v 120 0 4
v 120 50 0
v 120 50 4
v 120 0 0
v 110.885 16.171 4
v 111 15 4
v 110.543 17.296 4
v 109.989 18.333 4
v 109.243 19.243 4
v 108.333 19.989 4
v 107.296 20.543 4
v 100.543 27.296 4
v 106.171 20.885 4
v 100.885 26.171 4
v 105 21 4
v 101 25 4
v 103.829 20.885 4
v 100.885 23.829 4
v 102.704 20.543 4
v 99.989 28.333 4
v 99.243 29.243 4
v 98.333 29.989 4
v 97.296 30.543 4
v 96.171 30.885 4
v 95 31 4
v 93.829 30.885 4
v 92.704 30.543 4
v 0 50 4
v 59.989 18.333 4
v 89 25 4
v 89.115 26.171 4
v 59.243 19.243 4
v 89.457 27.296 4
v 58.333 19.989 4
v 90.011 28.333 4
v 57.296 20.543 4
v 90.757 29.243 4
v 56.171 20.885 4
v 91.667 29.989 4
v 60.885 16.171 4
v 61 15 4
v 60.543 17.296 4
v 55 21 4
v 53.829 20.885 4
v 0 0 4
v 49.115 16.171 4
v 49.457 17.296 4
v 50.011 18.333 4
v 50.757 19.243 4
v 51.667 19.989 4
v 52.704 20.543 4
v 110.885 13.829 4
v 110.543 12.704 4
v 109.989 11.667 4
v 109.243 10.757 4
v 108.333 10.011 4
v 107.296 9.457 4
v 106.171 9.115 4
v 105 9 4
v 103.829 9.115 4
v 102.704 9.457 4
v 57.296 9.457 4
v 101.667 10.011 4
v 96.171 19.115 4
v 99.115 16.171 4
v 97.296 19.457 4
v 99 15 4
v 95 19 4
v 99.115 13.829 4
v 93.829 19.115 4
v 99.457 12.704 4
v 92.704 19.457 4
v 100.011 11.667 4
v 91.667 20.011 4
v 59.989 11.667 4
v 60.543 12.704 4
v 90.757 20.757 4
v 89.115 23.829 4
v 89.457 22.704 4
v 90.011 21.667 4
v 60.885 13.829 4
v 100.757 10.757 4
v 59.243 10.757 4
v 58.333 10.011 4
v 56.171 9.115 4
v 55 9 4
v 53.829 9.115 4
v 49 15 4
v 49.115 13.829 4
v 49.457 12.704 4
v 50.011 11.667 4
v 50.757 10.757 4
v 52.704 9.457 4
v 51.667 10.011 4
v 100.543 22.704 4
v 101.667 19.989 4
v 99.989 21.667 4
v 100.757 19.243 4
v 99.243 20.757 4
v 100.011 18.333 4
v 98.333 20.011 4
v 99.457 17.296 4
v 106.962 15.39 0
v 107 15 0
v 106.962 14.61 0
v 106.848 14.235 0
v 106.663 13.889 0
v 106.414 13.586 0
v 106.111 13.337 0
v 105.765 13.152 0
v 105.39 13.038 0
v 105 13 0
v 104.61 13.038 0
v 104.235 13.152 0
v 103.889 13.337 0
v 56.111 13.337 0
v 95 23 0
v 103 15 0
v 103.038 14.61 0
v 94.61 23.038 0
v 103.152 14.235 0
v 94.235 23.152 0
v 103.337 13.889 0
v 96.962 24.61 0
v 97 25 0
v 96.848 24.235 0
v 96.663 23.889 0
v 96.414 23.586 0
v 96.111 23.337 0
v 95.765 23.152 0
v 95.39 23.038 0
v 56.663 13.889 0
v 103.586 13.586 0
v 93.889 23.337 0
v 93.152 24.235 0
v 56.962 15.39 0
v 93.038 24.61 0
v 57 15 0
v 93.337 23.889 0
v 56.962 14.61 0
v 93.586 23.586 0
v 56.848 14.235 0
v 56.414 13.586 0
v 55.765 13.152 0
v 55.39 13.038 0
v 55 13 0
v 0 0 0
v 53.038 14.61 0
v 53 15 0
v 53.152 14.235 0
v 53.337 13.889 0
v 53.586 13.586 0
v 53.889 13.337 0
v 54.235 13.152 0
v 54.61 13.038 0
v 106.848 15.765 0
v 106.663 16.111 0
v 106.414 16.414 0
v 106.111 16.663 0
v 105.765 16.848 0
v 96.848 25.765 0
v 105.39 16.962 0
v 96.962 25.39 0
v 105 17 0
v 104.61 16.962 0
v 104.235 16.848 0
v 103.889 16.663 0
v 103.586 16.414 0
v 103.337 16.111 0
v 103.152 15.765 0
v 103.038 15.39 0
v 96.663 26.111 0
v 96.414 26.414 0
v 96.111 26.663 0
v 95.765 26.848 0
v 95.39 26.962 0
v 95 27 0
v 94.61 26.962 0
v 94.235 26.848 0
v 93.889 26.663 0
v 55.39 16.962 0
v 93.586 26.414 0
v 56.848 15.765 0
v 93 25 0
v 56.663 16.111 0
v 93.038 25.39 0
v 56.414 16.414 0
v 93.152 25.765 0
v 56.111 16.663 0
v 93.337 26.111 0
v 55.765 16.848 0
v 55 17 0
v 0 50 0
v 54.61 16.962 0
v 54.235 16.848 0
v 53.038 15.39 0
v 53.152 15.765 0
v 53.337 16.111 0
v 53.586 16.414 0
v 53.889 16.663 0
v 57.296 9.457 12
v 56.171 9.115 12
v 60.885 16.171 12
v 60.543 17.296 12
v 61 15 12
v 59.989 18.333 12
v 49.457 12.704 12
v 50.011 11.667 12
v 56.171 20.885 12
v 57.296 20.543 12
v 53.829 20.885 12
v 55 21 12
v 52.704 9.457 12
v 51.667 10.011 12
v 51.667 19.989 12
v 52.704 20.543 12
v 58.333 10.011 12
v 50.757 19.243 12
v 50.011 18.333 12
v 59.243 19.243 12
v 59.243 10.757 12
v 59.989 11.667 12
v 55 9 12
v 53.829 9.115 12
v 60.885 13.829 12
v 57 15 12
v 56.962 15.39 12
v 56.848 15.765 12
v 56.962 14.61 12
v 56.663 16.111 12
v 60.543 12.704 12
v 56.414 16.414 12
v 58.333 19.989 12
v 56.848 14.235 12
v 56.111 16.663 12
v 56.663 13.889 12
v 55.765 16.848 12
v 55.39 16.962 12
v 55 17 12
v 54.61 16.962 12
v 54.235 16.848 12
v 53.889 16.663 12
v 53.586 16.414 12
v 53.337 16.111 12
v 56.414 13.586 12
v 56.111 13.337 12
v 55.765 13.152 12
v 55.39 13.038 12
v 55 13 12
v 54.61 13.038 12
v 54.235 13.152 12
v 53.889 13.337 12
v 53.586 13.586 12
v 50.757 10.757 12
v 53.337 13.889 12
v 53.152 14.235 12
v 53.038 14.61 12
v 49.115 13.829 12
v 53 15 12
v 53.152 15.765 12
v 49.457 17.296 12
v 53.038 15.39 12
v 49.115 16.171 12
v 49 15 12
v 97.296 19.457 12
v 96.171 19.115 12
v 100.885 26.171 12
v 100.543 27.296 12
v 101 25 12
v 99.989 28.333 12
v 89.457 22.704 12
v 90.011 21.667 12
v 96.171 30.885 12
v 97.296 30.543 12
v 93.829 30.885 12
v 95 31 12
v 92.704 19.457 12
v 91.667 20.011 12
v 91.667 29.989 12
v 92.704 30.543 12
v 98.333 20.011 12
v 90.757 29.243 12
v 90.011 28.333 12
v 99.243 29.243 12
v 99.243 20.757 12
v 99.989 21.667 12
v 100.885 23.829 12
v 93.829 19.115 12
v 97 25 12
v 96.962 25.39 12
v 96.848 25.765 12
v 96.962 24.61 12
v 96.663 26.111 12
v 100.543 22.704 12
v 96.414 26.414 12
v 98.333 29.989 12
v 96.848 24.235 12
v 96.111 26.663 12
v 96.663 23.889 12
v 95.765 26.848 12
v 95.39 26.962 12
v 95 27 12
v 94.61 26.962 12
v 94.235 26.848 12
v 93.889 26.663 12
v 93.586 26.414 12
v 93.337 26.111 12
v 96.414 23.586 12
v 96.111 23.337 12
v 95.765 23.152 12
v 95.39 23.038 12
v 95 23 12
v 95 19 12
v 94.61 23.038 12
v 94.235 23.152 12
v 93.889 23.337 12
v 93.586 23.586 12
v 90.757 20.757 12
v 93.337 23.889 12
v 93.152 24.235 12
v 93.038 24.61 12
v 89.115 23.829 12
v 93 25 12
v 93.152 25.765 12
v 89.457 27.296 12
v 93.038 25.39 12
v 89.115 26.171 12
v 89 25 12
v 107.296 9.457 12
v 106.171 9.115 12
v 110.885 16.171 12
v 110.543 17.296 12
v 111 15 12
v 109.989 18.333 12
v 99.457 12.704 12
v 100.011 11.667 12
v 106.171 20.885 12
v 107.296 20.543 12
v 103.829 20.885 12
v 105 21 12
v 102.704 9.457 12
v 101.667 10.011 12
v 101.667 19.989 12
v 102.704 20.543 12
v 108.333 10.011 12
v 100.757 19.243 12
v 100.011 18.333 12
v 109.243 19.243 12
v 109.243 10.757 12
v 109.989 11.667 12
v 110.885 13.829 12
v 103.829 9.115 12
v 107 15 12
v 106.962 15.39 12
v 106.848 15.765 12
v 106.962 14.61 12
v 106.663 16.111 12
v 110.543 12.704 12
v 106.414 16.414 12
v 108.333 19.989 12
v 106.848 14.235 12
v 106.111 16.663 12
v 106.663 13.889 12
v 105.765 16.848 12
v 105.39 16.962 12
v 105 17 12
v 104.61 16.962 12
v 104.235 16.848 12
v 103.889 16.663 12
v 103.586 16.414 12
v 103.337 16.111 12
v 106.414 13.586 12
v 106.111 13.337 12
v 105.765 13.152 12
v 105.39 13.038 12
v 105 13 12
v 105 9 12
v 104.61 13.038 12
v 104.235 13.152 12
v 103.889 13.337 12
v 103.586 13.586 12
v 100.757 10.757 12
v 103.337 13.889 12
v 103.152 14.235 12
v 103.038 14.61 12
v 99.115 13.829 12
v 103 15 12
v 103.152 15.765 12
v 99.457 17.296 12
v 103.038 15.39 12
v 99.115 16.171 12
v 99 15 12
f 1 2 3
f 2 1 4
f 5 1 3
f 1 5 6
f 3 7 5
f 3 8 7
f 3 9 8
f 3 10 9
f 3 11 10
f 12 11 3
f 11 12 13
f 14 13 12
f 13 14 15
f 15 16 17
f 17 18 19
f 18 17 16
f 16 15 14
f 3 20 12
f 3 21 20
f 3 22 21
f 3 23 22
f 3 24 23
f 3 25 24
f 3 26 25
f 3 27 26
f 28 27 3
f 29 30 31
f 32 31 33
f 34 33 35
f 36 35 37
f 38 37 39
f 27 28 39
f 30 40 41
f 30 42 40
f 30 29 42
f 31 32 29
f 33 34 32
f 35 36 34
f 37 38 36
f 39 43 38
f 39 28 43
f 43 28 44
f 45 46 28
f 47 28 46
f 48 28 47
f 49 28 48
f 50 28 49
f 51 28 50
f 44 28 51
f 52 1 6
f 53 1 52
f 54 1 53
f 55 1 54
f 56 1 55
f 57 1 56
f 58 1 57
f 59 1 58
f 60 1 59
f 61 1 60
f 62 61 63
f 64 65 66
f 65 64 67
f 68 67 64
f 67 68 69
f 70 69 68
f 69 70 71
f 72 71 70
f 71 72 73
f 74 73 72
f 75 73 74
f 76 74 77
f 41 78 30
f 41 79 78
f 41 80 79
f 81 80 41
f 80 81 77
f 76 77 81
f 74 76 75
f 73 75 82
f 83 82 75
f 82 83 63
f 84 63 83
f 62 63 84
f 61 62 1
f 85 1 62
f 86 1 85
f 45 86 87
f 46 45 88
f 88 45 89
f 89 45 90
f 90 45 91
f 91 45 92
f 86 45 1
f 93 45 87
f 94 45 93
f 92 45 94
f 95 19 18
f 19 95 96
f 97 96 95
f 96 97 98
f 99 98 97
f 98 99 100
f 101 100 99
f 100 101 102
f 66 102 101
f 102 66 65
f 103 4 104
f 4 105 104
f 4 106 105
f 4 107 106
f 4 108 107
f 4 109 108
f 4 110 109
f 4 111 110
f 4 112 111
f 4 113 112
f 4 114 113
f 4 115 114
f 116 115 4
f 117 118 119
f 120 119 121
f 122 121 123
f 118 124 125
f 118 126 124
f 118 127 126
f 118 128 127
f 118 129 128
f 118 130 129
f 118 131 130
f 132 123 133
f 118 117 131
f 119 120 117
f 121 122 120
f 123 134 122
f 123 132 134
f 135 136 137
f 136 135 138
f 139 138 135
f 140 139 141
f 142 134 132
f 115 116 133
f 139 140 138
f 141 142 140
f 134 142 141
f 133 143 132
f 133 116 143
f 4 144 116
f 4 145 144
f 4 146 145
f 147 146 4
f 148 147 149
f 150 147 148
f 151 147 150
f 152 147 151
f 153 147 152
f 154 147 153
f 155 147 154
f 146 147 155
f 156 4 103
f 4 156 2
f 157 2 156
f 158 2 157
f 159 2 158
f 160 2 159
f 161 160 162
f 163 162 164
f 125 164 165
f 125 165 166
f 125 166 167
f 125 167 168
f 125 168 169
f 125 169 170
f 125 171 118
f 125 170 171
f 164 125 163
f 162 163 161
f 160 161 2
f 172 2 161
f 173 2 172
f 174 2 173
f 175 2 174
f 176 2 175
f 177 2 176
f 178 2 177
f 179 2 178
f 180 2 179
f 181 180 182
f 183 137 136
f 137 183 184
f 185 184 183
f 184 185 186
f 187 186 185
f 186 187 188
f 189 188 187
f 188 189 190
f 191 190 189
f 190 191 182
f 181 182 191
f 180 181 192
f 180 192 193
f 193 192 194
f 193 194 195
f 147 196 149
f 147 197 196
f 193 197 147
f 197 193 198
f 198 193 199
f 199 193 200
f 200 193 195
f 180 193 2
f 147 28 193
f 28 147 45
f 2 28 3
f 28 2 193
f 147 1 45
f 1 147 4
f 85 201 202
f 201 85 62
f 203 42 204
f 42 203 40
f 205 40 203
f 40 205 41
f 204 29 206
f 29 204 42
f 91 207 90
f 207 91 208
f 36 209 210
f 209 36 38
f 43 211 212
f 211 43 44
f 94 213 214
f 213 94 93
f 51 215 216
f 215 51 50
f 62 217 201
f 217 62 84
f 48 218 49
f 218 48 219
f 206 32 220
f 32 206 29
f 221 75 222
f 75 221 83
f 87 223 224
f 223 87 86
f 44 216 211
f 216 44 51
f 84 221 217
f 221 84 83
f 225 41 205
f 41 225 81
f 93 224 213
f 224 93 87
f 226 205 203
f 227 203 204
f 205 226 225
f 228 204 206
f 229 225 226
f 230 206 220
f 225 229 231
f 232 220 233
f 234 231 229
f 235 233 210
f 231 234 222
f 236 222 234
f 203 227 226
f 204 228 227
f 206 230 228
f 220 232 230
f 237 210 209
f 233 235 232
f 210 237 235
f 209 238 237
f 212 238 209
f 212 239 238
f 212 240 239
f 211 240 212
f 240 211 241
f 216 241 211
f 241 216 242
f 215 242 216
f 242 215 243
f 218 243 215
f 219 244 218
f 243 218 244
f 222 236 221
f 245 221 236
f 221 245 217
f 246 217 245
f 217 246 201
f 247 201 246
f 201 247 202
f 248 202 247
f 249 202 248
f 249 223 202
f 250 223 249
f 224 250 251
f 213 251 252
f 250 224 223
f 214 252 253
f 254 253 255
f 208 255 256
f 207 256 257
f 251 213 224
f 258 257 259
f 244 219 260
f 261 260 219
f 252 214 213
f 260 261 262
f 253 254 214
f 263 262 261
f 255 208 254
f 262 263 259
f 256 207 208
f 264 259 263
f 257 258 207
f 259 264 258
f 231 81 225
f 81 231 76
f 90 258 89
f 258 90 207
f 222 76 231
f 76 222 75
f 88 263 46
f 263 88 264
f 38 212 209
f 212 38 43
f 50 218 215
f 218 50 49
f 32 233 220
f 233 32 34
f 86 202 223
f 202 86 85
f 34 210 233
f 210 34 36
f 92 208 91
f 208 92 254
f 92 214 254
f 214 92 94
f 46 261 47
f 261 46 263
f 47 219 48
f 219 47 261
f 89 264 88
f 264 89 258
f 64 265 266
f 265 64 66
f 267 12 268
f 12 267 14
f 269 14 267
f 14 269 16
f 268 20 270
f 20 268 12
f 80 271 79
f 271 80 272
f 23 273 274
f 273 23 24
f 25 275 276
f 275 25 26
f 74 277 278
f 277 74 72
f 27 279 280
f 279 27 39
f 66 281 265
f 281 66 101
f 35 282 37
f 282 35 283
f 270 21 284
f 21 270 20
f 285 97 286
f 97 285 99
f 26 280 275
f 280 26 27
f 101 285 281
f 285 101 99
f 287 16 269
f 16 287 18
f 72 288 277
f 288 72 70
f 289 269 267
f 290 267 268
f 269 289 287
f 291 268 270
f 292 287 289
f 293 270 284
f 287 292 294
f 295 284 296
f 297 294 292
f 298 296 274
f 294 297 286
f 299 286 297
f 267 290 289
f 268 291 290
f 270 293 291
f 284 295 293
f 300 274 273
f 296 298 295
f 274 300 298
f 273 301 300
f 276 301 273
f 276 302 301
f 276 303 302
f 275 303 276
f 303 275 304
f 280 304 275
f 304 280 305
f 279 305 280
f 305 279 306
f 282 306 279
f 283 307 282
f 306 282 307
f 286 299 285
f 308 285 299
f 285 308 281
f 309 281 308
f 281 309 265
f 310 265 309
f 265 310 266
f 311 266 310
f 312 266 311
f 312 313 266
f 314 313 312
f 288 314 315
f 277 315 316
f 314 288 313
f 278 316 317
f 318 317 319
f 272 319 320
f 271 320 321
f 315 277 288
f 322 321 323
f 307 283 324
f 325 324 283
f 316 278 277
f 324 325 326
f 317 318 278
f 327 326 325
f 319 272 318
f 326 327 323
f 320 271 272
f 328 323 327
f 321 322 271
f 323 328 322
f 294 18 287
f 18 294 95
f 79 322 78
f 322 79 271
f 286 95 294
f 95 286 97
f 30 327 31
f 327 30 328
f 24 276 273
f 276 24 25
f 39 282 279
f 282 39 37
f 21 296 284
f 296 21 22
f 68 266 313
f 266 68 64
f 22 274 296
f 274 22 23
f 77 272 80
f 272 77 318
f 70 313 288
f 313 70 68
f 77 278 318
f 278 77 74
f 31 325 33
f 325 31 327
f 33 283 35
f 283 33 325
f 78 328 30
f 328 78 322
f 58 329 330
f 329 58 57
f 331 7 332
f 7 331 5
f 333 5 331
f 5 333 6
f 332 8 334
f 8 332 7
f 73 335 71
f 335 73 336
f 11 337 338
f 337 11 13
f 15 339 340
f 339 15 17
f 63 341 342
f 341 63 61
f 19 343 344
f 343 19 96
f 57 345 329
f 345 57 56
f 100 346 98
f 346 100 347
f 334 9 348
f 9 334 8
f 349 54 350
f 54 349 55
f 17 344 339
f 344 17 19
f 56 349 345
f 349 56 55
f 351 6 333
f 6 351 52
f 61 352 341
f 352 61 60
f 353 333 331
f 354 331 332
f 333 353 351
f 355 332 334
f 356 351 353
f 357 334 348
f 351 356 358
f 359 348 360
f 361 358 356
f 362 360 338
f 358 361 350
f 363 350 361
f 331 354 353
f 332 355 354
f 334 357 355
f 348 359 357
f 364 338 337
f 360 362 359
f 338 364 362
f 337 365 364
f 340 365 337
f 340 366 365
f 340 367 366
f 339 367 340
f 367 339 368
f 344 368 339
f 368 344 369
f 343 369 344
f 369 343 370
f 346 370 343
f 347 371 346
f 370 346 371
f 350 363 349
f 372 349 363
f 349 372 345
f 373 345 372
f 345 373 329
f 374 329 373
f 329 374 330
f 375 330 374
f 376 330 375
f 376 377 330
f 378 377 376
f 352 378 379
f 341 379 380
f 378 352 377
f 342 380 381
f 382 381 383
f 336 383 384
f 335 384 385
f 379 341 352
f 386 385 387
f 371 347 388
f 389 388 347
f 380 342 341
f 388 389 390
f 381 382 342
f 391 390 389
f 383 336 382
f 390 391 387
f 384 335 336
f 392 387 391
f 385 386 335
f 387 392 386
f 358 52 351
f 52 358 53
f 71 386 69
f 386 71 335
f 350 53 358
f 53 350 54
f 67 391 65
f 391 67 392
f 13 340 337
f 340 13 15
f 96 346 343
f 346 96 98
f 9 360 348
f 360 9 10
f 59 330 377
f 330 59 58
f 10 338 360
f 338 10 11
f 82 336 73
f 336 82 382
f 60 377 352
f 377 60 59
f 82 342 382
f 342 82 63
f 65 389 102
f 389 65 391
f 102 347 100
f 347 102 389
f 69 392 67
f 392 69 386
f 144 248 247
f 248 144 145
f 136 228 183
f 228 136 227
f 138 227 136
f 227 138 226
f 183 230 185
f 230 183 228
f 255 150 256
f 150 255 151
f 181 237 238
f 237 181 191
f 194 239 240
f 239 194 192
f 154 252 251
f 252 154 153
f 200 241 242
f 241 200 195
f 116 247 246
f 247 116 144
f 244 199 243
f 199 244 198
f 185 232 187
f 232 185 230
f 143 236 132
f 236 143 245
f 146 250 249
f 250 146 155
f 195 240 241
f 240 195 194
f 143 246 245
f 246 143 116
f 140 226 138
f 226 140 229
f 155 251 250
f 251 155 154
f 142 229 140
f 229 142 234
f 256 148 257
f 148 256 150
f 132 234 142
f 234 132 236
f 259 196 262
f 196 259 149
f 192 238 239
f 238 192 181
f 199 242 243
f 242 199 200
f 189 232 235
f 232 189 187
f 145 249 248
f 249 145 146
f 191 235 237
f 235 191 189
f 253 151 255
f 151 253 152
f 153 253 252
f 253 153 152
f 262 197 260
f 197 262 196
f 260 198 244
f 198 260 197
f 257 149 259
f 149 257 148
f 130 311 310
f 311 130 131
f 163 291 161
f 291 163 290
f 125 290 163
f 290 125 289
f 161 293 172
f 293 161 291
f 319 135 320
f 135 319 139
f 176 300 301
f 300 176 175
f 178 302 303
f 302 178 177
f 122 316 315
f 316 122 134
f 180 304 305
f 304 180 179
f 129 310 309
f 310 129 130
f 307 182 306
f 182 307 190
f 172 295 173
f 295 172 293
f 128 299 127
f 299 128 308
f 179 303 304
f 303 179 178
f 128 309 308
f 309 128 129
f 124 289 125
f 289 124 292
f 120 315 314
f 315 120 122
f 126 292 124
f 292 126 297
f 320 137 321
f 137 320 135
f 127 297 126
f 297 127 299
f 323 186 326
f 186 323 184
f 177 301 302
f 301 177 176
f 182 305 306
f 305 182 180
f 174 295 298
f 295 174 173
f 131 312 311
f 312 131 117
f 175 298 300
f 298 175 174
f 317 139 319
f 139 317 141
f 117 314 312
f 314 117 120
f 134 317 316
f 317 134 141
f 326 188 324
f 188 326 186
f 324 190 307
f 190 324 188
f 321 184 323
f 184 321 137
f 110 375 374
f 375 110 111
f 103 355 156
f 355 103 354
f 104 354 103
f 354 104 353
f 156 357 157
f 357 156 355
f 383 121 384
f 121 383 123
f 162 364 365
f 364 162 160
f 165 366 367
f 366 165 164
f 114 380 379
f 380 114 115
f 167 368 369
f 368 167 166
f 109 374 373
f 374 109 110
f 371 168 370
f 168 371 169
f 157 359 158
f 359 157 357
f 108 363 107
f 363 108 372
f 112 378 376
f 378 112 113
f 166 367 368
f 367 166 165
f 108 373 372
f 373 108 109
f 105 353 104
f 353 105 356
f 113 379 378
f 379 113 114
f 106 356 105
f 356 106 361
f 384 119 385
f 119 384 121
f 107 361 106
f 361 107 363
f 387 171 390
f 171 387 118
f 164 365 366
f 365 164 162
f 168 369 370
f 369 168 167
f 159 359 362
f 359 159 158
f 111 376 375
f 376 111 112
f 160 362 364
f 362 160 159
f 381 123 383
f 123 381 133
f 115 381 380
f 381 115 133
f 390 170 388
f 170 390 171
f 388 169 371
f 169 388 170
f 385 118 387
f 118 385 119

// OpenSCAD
$fn = 32;

// ----------------------------------------------------------------------
// Boss field: plate with bosses at given coordinates
// ----------------------------------------------------------------------

// --- parameters (mm) ---
plate_l = 120;            // plate length, X
plate_w = 50;             // plate width, Y
plate_t = 4;              // plate thickness, Z
boss_d = 12;              // boss diameter
boss_h = 8;               // boss height above the plate
bore_d = 4;               // boss bore
fit_tol = 0.05;           // tolerance for press fits, mm
free_tol = 0.2;           // tolerance for clearance fits, mm

total_h = plate_t + boss_h;  // overall height

difference() {
  union() {
    cube([plate_l, plate_w, plate_t]);
    translate([55, 15, plate_t]) cylinder(h = boss_h, d = boss_d);
    translate([95, 25, plate_t]) cylinder(h = boss_h, d = boss_d);
    translate([105, 15, plate_t]) cylinder(h = boss_h, d = boss_d);
  }
  translate([55, 15, -1]) cylinder(h = total_h + 2, d = bore_d);
  translate([95, 25, -1]) cylinder(h = total_h + 2, d = bore_d);
  translate([105, 15, -1]) cylinder(h = total_h + 2, d = bore_d);
}
